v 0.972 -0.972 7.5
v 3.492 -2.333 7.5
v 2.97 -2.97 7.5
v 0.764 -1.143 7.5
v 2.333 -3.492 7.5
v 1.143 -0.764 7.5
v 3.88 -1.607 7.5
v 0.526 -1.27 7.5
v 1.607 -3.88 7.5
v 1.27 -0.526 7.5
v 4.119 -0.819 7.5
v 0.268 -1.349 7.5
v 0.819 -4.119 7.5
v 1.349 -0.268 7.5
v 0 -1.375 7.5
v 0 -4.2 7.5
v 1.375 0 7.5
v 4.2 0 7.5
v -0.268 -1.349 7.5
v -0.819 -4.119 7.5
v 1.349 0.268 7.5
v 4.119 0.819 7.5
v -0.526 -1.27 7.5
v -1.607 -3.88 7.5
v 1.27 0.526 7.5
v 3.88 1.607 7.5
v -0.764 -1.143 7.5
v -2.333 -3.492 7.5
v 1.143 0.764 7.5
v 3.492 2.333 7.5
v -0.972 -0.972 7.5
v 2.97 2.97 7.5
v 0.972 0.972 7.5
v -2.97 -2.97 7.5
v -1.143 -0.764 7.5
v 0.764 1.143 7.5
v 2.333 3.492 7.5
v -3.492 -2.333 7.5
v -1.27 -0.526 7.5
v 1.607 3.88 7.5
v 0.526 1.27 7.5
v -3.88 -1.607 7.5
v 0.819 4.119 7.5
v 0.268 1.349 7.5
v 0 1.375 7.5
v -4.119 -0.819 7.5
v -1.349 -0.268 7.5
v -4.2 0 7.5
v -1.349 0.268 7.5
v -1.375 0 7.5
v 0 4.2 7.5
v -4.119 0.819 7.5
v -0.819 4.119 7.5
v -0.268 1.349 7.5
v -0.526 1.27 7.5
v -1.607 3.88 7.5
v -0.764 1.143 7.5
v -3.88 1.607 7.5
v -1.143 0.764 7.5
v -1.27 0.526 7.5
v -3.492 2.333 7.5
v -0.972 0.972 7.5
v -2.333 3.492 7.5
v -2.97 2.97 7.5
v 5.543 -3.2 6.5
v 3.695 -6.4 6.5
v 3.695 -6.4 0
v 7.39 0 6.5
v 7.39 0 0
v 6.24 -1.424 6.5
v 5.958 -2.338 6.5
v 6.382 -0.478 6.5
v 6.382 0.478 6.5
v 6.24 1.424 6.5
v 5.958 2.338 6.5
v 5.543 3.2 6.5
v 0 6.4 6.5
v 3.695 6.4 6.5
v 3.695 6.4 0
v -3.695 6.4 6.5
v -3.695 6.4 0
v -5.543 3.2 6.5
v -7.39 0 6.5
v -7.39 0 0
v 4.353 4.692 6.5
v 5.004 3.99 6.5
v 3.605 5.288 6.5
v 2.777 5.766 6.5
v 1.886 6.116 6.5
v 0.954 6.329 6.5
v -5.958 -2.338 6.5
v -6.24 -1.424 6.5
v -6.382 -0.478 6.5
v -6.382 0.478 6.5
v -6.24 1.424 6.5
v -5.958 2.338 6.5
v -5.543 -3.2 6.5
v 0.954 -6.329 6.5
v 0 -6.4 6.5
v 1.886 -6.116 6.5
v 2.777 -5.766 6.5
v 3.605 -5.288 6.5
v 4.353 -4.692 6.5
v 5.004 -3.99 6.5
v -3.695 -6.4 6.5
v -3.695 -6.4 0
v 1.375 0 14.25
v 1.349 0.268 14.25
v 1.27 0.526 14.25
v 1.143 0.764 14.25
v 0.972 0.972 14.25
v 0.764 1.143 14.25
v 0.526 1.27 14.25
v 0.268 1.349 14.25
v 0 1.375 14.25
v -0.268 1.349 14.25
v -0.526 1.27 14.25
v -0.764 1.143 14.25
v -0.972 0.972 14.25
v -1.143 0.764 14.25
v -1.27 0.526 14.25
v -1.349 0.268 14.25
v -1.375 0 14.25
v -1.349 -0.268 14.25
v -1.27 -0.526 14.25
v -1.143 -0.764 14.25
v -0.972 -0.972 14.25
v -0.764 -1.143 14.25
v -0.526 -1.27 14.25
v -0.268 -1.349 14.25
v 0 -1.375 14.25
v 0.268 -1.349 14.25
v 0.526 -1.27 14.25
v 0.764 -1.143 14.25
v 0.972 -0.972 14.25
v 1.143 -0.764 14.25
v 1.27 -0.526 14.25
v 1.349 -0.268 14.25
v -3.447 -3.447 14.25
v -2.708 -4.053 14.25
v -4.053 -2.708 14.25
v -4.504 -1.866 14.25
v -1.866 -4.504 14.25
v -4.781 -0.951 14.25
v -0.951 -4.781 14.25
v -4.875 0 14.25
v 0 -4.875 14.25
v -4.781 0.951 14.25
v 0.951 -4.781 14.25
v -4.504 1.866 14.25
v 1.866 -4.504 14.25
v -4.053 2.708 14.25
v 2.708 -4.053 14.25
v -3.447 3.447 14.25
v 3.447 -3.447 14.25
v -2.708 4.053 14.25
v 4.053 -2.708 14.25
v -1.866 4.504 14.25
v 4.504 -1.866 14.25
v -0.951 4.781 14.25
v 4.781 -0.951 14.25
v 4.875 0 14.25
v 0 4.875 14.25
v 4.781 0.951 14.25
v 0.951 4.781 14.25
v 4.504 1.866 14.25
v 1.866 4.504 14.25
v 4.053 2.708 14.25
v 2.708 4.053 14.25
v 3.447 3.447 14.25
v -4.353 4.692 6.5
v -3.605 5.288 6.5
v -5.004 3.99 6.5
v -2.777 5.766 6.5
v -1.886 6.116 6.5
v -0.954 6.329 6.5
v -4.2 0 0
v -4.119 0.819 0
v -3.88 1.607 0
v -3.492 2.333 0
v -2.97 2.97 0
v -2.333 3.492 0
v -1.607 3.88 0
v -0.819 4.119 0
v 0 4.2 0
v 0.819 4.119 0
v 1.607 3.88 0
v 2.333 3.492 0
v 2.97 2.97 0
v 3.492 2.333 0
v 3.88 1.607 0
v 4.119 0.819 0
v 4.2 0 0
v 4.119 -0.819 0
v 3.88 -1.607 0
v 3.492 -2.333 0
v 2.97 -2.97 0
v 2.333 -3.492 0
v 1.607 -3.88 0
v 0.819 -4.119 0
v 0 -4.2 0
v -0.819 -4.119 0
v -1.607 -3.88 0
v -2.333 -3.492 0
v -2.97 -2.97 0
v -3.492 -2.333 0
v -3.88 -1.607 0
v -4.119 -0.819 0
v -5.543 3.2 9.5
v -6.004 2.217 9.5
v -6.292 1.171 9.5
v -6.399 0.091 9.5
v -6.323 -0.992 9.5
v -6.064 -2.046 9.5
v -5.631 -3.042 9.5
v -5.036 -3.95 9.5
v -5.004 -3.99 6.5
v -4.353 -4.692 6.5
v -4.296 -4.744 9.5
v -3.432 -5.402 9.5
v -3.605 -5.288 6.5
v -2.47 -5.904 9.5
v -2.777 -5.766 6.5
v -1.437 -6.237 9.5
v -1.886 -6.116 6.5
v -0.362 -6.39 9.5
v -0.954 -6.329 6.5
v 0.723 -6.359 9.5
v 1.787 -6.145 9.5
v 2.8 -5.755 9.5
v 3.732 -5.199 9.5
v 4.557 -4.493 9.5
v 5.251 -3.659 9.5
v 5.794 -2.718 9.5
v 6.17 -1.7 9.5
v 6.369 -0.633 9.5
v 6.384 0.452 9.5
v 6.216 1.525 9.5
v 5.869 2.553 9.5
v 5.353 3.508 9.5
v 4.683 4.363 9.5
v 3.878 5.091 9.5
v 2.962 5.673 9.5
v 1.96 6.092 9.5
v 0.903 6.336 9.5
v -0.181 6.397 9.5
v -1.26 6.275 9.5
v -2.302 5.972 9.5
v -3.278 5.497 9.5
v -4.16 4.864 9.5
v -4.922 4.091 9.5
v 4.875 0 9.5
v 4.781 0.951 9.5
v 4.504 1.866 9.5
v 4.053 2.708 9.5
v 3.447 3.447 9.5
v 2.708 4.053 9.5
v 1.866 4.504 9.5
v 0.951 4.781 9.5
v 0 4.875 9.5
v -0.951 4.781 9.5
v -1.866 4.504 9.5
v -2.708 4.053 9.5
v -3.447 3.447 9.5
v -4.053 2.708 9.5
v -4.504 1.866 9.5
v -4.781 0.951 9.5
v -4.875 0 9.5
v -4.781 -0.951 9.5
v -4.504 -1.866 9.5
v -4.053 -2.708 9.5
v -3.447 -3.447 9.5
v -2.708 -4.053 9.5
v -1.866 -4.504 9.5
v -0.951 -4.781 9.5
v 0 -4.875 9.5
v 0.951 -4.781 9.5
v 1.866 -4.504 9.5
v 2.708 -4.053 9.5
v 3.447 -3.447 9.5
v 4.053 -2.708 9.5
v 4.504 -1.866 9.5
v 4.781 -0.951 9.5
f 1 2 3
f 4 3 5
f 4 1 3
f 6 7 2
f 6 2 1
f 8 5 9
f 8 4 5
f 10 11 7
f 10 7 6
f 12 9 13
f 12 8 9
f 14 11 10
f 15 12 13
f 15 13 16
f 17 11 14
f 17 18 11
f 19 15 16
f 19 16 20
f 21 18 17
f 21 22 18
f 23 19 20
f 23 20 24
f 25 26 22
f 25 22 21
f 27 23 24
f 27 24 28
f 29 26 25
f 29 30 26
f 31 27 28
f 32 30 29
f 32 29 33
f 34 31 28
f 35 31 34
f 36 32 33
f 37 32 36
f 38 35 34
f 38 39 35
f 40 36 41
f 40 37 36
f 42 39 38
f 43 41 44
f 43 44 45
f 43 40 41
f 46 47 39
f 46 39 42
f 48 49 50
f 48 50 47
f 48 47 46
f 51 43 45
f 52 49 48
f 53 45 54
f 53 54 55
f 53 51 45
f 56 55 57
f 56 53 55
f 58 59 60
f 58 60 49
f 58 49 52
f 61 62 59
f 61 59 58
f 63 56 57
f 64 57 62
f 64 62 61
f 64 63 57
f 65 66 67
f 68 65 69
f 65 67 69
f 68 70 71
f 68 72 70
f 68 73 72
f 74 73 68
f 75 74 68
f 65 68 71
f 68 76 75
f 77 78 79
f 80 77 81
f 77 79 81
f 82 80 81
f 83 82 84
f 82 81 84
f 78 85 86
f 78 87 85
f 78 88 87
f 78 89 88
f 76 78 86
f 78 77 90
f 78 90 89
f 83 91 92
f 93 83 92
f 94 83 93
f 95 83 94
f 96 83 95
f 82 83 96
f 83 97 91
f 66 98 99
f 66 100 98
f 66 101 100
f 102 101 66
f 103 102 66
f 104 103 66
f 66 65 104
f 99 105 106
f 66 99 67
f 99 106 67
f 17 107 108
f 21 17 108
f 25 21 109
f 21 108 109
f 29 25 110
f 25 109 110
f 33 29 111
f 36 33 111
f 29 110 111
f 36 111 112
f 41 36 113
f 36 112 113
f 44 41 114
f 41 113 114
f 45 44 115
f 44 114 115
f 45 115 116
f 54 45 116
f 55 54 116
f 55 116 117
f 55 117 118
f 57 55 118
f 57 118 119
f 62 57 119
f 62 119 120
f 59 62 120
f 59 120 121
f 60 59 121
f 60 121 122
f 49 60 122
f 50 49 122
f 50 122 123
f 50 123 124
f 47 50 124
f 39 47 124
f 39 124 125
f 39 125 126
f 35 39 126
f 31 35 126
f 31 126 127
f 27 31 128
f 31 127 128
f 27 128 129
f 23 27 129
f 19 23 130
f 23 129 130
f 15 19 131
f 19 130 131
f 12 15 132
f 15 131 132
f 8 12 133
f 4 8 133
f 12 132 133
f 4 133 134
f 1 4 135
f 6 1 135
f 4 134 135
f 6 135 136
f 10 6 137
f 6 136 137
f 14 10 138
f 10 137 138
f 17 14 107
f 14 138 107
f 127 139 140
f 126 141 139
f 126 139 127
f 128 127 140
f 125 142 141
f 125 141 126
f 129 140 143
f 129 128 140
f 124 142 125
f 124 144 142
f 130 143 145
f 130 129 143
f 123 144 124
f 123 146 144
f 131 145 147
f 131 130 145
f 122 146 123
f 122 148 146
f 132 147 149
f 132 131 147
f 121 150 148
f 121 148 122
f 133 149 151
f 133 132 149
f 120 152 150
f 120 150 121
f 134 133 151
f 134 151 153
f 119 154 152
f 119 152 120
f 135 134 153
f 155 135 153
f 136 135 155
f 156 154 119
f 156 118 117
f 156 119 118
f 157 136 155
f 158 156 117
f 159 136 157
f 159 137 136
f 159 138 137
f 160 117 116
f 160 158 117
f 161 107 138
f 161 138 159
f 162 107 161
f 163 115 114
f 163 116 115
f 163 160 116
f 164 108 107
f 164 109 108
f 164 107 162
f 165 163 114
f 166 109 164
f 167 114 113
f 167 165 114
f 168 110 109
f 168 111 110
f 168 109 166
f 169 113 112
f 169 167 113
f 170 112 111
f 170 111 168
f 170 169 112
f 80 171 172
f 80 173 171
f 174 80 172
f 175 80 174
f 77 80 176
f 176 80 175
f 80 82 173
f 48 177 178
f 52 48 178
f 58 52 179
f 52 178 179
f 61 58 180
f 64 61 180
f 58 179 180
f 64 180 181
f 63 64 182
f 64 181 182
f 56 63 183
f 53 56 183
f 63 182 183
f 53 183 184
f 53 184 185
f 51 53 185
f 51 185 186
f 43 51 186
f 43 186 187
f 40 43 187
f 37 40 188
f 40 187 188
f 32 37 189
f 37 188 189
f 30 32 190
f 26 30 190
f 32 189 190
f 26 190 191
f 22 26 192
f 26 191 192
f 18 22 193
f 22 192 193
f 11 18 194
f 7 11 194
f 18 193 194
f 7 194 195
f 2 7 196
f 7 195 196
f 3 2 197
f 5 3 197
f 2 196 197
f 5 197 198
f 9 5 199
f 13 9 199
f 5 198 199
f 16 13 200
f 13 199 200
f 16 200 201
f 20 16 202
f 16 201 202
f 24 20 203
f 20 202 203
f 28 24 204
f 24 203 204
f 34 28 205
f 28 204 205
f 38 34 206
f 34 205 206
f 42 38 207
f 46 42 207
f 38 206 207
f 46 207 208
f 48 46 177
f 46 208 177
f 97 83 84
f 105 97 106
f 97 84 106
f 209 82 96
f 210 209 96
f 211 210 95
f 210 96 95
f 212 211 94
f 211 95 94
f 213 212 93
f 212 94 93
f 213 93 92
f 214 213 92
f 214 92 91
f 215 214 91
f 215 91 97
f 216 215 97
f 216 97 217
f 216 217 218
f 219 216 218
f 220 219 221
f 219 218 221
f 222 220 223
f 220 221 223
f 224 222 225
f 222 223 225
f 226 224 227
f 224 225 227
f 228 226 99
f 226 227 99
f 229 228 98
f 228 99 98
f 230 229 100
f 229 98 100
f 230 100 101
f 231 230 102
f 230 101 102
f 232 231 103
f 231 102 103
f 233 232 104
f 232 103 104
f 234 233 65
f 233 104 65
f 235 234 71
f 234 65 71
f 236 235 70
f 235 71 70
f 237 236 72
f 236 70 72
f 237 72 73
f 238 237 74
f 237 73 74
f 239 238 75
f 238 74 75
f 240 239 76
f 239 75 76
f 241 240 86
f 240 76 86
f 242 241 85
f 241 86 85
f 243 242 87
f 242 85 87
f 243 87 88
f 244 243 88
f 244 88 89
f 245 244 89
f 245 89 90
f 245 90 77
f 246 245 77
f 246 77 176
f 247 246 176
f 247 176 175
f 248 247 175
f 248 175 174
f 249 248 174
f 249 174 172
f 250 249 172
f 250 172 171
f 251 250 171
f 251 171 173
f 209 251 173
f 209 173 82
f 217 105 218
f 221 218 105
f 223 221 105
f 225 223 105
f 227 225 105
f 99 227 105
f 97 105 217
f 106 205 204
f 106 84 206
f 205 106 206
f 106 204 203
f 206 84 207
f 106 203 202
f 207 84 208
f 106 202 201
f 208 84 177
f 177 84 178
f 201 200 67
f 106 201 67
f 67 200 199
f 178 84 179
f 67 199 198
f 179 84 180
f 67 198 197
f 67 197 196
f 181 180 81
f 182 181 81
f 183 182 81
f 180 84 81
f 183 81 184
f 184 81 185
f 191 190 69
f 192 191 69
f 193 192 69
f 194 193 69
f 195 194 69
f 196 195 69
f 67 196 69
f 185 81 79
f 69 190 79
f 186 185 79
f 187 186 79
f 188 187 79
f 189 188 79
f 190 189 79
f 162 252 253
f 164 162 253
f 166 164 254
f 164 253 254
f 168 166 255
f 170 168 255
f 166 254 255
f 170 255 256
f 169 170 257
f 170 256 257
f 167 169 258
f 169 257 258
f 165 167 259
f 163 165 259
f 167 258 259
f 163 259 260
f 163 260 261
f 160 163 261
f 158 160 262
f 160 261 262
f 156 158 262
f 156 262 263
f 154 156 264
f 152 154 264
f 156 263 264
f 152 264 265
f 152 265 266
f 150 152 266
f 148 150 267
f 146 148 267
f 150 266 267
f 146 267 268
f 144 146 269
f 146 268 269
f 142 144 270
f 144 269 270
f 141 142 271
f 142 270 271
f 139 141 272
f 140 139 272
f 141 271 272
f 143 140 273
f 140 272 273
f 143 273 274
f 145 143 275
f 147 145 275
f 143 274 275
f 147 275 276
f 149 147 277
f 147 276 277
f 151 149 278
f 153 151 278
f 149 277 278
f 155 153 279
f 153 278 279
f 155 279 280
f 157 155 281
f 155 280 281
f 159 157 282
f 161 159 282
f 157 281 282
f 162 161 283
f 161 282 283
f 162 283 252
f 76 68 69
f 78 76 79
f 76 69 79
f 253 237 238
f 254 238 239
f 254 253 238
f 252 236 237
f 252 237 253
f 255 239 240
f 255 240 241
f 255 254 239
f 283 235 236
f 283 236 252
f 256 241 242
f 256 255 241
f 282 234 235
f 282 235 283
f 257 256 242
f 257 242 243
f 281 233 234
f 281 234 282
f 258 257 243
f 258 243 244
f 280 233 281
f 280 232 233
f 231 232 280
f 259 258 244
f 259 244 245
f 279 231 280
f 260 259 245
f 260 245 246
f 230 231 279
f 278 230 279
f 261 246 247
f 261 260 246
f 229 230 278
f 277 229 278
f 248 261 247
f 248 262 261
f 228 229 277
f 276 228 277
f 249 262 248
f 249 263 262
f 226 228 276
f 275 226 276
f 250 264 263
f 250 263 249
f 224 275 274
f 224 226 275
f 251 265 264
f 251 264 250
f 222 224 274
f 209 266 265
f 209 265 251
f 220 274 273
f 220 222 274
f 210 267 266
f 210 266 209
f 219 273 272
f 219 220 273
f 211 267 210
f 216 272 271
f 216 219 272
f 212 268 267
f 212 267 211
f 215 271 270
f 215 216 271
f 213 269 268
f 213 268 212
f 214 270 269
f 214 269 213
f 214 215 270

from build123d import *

# Parameters (mm, degrees)
BOSS_EXTRUDE1_DEPTH = 6.5
SKETCH2_R           = 6.4
BOSS_EXTRUDE2_DEPTH = 3
SKETCH3_R           = 4.2
CUT_EXTRUDE1_DEPTH  = 7.5
SKETCH5_R           = 4.875
BOSS_EXTRUDE3_DEPTH = 4.75
SKETCH6_R           = 1.375
CUT_EXTRUDE2_DEPTH  = 18.281083106


with BuildPart() as part:
    # Sketch1 → Boss-Extrude1 (new body)
    with BuildSketch(Plane.XY):
        Polygon((7.390083446, 0), (3.695041723, 6.4), (-3.695041723, 6.4), (-7.390083446, 0), (-3.695041723, -6.4), (3.695041723, -6.4), align=None)
    extrude(amount=BOSS_EXTRUDE1_DEPTH)

    # Sketch2 → Boss-Extrude2 (add)
    with BuildSketch(Plane.XY.offset(6.5)):
        with Locations(Location((0, 0, 0), (0, 0, 150))):
            Circle(SKETCH2_R)
    extrude(amount=BOSS_EXTRUDE2_DEPTH)

    # Sketch3 → Cut-Extrude1 (cut)
    with BuildSketch(Plane(origin=(0, 0, 0), x_dir=(-1, 0, 0), z_dir=(0, 0, -1))):
        Circle(SKETCH3_R)
    extrude(amount=-CUT_EXTRUDE1_DEPTH, mode=Mode.SUBTRACT)

    # Sketch5 → Boss-Extrude3 (add)
    with BuildSketch(Plane.XY.offset(9.5)):
        Circle(SKETCH5_R)
    extrude(amount=BOSS_EXTRUDE3_DEPTH)

    # Sketch6 → Cut-Extrude2 (cut, through all)
    with BuildSketch(Plane.XY.offset(14.25)):
        Circle(SKETCH6_R)
    extrude(amount=-CUT_EXTRUDE2_DEPTH, mode=Mode.SUBTRACT)


solid = part.part
